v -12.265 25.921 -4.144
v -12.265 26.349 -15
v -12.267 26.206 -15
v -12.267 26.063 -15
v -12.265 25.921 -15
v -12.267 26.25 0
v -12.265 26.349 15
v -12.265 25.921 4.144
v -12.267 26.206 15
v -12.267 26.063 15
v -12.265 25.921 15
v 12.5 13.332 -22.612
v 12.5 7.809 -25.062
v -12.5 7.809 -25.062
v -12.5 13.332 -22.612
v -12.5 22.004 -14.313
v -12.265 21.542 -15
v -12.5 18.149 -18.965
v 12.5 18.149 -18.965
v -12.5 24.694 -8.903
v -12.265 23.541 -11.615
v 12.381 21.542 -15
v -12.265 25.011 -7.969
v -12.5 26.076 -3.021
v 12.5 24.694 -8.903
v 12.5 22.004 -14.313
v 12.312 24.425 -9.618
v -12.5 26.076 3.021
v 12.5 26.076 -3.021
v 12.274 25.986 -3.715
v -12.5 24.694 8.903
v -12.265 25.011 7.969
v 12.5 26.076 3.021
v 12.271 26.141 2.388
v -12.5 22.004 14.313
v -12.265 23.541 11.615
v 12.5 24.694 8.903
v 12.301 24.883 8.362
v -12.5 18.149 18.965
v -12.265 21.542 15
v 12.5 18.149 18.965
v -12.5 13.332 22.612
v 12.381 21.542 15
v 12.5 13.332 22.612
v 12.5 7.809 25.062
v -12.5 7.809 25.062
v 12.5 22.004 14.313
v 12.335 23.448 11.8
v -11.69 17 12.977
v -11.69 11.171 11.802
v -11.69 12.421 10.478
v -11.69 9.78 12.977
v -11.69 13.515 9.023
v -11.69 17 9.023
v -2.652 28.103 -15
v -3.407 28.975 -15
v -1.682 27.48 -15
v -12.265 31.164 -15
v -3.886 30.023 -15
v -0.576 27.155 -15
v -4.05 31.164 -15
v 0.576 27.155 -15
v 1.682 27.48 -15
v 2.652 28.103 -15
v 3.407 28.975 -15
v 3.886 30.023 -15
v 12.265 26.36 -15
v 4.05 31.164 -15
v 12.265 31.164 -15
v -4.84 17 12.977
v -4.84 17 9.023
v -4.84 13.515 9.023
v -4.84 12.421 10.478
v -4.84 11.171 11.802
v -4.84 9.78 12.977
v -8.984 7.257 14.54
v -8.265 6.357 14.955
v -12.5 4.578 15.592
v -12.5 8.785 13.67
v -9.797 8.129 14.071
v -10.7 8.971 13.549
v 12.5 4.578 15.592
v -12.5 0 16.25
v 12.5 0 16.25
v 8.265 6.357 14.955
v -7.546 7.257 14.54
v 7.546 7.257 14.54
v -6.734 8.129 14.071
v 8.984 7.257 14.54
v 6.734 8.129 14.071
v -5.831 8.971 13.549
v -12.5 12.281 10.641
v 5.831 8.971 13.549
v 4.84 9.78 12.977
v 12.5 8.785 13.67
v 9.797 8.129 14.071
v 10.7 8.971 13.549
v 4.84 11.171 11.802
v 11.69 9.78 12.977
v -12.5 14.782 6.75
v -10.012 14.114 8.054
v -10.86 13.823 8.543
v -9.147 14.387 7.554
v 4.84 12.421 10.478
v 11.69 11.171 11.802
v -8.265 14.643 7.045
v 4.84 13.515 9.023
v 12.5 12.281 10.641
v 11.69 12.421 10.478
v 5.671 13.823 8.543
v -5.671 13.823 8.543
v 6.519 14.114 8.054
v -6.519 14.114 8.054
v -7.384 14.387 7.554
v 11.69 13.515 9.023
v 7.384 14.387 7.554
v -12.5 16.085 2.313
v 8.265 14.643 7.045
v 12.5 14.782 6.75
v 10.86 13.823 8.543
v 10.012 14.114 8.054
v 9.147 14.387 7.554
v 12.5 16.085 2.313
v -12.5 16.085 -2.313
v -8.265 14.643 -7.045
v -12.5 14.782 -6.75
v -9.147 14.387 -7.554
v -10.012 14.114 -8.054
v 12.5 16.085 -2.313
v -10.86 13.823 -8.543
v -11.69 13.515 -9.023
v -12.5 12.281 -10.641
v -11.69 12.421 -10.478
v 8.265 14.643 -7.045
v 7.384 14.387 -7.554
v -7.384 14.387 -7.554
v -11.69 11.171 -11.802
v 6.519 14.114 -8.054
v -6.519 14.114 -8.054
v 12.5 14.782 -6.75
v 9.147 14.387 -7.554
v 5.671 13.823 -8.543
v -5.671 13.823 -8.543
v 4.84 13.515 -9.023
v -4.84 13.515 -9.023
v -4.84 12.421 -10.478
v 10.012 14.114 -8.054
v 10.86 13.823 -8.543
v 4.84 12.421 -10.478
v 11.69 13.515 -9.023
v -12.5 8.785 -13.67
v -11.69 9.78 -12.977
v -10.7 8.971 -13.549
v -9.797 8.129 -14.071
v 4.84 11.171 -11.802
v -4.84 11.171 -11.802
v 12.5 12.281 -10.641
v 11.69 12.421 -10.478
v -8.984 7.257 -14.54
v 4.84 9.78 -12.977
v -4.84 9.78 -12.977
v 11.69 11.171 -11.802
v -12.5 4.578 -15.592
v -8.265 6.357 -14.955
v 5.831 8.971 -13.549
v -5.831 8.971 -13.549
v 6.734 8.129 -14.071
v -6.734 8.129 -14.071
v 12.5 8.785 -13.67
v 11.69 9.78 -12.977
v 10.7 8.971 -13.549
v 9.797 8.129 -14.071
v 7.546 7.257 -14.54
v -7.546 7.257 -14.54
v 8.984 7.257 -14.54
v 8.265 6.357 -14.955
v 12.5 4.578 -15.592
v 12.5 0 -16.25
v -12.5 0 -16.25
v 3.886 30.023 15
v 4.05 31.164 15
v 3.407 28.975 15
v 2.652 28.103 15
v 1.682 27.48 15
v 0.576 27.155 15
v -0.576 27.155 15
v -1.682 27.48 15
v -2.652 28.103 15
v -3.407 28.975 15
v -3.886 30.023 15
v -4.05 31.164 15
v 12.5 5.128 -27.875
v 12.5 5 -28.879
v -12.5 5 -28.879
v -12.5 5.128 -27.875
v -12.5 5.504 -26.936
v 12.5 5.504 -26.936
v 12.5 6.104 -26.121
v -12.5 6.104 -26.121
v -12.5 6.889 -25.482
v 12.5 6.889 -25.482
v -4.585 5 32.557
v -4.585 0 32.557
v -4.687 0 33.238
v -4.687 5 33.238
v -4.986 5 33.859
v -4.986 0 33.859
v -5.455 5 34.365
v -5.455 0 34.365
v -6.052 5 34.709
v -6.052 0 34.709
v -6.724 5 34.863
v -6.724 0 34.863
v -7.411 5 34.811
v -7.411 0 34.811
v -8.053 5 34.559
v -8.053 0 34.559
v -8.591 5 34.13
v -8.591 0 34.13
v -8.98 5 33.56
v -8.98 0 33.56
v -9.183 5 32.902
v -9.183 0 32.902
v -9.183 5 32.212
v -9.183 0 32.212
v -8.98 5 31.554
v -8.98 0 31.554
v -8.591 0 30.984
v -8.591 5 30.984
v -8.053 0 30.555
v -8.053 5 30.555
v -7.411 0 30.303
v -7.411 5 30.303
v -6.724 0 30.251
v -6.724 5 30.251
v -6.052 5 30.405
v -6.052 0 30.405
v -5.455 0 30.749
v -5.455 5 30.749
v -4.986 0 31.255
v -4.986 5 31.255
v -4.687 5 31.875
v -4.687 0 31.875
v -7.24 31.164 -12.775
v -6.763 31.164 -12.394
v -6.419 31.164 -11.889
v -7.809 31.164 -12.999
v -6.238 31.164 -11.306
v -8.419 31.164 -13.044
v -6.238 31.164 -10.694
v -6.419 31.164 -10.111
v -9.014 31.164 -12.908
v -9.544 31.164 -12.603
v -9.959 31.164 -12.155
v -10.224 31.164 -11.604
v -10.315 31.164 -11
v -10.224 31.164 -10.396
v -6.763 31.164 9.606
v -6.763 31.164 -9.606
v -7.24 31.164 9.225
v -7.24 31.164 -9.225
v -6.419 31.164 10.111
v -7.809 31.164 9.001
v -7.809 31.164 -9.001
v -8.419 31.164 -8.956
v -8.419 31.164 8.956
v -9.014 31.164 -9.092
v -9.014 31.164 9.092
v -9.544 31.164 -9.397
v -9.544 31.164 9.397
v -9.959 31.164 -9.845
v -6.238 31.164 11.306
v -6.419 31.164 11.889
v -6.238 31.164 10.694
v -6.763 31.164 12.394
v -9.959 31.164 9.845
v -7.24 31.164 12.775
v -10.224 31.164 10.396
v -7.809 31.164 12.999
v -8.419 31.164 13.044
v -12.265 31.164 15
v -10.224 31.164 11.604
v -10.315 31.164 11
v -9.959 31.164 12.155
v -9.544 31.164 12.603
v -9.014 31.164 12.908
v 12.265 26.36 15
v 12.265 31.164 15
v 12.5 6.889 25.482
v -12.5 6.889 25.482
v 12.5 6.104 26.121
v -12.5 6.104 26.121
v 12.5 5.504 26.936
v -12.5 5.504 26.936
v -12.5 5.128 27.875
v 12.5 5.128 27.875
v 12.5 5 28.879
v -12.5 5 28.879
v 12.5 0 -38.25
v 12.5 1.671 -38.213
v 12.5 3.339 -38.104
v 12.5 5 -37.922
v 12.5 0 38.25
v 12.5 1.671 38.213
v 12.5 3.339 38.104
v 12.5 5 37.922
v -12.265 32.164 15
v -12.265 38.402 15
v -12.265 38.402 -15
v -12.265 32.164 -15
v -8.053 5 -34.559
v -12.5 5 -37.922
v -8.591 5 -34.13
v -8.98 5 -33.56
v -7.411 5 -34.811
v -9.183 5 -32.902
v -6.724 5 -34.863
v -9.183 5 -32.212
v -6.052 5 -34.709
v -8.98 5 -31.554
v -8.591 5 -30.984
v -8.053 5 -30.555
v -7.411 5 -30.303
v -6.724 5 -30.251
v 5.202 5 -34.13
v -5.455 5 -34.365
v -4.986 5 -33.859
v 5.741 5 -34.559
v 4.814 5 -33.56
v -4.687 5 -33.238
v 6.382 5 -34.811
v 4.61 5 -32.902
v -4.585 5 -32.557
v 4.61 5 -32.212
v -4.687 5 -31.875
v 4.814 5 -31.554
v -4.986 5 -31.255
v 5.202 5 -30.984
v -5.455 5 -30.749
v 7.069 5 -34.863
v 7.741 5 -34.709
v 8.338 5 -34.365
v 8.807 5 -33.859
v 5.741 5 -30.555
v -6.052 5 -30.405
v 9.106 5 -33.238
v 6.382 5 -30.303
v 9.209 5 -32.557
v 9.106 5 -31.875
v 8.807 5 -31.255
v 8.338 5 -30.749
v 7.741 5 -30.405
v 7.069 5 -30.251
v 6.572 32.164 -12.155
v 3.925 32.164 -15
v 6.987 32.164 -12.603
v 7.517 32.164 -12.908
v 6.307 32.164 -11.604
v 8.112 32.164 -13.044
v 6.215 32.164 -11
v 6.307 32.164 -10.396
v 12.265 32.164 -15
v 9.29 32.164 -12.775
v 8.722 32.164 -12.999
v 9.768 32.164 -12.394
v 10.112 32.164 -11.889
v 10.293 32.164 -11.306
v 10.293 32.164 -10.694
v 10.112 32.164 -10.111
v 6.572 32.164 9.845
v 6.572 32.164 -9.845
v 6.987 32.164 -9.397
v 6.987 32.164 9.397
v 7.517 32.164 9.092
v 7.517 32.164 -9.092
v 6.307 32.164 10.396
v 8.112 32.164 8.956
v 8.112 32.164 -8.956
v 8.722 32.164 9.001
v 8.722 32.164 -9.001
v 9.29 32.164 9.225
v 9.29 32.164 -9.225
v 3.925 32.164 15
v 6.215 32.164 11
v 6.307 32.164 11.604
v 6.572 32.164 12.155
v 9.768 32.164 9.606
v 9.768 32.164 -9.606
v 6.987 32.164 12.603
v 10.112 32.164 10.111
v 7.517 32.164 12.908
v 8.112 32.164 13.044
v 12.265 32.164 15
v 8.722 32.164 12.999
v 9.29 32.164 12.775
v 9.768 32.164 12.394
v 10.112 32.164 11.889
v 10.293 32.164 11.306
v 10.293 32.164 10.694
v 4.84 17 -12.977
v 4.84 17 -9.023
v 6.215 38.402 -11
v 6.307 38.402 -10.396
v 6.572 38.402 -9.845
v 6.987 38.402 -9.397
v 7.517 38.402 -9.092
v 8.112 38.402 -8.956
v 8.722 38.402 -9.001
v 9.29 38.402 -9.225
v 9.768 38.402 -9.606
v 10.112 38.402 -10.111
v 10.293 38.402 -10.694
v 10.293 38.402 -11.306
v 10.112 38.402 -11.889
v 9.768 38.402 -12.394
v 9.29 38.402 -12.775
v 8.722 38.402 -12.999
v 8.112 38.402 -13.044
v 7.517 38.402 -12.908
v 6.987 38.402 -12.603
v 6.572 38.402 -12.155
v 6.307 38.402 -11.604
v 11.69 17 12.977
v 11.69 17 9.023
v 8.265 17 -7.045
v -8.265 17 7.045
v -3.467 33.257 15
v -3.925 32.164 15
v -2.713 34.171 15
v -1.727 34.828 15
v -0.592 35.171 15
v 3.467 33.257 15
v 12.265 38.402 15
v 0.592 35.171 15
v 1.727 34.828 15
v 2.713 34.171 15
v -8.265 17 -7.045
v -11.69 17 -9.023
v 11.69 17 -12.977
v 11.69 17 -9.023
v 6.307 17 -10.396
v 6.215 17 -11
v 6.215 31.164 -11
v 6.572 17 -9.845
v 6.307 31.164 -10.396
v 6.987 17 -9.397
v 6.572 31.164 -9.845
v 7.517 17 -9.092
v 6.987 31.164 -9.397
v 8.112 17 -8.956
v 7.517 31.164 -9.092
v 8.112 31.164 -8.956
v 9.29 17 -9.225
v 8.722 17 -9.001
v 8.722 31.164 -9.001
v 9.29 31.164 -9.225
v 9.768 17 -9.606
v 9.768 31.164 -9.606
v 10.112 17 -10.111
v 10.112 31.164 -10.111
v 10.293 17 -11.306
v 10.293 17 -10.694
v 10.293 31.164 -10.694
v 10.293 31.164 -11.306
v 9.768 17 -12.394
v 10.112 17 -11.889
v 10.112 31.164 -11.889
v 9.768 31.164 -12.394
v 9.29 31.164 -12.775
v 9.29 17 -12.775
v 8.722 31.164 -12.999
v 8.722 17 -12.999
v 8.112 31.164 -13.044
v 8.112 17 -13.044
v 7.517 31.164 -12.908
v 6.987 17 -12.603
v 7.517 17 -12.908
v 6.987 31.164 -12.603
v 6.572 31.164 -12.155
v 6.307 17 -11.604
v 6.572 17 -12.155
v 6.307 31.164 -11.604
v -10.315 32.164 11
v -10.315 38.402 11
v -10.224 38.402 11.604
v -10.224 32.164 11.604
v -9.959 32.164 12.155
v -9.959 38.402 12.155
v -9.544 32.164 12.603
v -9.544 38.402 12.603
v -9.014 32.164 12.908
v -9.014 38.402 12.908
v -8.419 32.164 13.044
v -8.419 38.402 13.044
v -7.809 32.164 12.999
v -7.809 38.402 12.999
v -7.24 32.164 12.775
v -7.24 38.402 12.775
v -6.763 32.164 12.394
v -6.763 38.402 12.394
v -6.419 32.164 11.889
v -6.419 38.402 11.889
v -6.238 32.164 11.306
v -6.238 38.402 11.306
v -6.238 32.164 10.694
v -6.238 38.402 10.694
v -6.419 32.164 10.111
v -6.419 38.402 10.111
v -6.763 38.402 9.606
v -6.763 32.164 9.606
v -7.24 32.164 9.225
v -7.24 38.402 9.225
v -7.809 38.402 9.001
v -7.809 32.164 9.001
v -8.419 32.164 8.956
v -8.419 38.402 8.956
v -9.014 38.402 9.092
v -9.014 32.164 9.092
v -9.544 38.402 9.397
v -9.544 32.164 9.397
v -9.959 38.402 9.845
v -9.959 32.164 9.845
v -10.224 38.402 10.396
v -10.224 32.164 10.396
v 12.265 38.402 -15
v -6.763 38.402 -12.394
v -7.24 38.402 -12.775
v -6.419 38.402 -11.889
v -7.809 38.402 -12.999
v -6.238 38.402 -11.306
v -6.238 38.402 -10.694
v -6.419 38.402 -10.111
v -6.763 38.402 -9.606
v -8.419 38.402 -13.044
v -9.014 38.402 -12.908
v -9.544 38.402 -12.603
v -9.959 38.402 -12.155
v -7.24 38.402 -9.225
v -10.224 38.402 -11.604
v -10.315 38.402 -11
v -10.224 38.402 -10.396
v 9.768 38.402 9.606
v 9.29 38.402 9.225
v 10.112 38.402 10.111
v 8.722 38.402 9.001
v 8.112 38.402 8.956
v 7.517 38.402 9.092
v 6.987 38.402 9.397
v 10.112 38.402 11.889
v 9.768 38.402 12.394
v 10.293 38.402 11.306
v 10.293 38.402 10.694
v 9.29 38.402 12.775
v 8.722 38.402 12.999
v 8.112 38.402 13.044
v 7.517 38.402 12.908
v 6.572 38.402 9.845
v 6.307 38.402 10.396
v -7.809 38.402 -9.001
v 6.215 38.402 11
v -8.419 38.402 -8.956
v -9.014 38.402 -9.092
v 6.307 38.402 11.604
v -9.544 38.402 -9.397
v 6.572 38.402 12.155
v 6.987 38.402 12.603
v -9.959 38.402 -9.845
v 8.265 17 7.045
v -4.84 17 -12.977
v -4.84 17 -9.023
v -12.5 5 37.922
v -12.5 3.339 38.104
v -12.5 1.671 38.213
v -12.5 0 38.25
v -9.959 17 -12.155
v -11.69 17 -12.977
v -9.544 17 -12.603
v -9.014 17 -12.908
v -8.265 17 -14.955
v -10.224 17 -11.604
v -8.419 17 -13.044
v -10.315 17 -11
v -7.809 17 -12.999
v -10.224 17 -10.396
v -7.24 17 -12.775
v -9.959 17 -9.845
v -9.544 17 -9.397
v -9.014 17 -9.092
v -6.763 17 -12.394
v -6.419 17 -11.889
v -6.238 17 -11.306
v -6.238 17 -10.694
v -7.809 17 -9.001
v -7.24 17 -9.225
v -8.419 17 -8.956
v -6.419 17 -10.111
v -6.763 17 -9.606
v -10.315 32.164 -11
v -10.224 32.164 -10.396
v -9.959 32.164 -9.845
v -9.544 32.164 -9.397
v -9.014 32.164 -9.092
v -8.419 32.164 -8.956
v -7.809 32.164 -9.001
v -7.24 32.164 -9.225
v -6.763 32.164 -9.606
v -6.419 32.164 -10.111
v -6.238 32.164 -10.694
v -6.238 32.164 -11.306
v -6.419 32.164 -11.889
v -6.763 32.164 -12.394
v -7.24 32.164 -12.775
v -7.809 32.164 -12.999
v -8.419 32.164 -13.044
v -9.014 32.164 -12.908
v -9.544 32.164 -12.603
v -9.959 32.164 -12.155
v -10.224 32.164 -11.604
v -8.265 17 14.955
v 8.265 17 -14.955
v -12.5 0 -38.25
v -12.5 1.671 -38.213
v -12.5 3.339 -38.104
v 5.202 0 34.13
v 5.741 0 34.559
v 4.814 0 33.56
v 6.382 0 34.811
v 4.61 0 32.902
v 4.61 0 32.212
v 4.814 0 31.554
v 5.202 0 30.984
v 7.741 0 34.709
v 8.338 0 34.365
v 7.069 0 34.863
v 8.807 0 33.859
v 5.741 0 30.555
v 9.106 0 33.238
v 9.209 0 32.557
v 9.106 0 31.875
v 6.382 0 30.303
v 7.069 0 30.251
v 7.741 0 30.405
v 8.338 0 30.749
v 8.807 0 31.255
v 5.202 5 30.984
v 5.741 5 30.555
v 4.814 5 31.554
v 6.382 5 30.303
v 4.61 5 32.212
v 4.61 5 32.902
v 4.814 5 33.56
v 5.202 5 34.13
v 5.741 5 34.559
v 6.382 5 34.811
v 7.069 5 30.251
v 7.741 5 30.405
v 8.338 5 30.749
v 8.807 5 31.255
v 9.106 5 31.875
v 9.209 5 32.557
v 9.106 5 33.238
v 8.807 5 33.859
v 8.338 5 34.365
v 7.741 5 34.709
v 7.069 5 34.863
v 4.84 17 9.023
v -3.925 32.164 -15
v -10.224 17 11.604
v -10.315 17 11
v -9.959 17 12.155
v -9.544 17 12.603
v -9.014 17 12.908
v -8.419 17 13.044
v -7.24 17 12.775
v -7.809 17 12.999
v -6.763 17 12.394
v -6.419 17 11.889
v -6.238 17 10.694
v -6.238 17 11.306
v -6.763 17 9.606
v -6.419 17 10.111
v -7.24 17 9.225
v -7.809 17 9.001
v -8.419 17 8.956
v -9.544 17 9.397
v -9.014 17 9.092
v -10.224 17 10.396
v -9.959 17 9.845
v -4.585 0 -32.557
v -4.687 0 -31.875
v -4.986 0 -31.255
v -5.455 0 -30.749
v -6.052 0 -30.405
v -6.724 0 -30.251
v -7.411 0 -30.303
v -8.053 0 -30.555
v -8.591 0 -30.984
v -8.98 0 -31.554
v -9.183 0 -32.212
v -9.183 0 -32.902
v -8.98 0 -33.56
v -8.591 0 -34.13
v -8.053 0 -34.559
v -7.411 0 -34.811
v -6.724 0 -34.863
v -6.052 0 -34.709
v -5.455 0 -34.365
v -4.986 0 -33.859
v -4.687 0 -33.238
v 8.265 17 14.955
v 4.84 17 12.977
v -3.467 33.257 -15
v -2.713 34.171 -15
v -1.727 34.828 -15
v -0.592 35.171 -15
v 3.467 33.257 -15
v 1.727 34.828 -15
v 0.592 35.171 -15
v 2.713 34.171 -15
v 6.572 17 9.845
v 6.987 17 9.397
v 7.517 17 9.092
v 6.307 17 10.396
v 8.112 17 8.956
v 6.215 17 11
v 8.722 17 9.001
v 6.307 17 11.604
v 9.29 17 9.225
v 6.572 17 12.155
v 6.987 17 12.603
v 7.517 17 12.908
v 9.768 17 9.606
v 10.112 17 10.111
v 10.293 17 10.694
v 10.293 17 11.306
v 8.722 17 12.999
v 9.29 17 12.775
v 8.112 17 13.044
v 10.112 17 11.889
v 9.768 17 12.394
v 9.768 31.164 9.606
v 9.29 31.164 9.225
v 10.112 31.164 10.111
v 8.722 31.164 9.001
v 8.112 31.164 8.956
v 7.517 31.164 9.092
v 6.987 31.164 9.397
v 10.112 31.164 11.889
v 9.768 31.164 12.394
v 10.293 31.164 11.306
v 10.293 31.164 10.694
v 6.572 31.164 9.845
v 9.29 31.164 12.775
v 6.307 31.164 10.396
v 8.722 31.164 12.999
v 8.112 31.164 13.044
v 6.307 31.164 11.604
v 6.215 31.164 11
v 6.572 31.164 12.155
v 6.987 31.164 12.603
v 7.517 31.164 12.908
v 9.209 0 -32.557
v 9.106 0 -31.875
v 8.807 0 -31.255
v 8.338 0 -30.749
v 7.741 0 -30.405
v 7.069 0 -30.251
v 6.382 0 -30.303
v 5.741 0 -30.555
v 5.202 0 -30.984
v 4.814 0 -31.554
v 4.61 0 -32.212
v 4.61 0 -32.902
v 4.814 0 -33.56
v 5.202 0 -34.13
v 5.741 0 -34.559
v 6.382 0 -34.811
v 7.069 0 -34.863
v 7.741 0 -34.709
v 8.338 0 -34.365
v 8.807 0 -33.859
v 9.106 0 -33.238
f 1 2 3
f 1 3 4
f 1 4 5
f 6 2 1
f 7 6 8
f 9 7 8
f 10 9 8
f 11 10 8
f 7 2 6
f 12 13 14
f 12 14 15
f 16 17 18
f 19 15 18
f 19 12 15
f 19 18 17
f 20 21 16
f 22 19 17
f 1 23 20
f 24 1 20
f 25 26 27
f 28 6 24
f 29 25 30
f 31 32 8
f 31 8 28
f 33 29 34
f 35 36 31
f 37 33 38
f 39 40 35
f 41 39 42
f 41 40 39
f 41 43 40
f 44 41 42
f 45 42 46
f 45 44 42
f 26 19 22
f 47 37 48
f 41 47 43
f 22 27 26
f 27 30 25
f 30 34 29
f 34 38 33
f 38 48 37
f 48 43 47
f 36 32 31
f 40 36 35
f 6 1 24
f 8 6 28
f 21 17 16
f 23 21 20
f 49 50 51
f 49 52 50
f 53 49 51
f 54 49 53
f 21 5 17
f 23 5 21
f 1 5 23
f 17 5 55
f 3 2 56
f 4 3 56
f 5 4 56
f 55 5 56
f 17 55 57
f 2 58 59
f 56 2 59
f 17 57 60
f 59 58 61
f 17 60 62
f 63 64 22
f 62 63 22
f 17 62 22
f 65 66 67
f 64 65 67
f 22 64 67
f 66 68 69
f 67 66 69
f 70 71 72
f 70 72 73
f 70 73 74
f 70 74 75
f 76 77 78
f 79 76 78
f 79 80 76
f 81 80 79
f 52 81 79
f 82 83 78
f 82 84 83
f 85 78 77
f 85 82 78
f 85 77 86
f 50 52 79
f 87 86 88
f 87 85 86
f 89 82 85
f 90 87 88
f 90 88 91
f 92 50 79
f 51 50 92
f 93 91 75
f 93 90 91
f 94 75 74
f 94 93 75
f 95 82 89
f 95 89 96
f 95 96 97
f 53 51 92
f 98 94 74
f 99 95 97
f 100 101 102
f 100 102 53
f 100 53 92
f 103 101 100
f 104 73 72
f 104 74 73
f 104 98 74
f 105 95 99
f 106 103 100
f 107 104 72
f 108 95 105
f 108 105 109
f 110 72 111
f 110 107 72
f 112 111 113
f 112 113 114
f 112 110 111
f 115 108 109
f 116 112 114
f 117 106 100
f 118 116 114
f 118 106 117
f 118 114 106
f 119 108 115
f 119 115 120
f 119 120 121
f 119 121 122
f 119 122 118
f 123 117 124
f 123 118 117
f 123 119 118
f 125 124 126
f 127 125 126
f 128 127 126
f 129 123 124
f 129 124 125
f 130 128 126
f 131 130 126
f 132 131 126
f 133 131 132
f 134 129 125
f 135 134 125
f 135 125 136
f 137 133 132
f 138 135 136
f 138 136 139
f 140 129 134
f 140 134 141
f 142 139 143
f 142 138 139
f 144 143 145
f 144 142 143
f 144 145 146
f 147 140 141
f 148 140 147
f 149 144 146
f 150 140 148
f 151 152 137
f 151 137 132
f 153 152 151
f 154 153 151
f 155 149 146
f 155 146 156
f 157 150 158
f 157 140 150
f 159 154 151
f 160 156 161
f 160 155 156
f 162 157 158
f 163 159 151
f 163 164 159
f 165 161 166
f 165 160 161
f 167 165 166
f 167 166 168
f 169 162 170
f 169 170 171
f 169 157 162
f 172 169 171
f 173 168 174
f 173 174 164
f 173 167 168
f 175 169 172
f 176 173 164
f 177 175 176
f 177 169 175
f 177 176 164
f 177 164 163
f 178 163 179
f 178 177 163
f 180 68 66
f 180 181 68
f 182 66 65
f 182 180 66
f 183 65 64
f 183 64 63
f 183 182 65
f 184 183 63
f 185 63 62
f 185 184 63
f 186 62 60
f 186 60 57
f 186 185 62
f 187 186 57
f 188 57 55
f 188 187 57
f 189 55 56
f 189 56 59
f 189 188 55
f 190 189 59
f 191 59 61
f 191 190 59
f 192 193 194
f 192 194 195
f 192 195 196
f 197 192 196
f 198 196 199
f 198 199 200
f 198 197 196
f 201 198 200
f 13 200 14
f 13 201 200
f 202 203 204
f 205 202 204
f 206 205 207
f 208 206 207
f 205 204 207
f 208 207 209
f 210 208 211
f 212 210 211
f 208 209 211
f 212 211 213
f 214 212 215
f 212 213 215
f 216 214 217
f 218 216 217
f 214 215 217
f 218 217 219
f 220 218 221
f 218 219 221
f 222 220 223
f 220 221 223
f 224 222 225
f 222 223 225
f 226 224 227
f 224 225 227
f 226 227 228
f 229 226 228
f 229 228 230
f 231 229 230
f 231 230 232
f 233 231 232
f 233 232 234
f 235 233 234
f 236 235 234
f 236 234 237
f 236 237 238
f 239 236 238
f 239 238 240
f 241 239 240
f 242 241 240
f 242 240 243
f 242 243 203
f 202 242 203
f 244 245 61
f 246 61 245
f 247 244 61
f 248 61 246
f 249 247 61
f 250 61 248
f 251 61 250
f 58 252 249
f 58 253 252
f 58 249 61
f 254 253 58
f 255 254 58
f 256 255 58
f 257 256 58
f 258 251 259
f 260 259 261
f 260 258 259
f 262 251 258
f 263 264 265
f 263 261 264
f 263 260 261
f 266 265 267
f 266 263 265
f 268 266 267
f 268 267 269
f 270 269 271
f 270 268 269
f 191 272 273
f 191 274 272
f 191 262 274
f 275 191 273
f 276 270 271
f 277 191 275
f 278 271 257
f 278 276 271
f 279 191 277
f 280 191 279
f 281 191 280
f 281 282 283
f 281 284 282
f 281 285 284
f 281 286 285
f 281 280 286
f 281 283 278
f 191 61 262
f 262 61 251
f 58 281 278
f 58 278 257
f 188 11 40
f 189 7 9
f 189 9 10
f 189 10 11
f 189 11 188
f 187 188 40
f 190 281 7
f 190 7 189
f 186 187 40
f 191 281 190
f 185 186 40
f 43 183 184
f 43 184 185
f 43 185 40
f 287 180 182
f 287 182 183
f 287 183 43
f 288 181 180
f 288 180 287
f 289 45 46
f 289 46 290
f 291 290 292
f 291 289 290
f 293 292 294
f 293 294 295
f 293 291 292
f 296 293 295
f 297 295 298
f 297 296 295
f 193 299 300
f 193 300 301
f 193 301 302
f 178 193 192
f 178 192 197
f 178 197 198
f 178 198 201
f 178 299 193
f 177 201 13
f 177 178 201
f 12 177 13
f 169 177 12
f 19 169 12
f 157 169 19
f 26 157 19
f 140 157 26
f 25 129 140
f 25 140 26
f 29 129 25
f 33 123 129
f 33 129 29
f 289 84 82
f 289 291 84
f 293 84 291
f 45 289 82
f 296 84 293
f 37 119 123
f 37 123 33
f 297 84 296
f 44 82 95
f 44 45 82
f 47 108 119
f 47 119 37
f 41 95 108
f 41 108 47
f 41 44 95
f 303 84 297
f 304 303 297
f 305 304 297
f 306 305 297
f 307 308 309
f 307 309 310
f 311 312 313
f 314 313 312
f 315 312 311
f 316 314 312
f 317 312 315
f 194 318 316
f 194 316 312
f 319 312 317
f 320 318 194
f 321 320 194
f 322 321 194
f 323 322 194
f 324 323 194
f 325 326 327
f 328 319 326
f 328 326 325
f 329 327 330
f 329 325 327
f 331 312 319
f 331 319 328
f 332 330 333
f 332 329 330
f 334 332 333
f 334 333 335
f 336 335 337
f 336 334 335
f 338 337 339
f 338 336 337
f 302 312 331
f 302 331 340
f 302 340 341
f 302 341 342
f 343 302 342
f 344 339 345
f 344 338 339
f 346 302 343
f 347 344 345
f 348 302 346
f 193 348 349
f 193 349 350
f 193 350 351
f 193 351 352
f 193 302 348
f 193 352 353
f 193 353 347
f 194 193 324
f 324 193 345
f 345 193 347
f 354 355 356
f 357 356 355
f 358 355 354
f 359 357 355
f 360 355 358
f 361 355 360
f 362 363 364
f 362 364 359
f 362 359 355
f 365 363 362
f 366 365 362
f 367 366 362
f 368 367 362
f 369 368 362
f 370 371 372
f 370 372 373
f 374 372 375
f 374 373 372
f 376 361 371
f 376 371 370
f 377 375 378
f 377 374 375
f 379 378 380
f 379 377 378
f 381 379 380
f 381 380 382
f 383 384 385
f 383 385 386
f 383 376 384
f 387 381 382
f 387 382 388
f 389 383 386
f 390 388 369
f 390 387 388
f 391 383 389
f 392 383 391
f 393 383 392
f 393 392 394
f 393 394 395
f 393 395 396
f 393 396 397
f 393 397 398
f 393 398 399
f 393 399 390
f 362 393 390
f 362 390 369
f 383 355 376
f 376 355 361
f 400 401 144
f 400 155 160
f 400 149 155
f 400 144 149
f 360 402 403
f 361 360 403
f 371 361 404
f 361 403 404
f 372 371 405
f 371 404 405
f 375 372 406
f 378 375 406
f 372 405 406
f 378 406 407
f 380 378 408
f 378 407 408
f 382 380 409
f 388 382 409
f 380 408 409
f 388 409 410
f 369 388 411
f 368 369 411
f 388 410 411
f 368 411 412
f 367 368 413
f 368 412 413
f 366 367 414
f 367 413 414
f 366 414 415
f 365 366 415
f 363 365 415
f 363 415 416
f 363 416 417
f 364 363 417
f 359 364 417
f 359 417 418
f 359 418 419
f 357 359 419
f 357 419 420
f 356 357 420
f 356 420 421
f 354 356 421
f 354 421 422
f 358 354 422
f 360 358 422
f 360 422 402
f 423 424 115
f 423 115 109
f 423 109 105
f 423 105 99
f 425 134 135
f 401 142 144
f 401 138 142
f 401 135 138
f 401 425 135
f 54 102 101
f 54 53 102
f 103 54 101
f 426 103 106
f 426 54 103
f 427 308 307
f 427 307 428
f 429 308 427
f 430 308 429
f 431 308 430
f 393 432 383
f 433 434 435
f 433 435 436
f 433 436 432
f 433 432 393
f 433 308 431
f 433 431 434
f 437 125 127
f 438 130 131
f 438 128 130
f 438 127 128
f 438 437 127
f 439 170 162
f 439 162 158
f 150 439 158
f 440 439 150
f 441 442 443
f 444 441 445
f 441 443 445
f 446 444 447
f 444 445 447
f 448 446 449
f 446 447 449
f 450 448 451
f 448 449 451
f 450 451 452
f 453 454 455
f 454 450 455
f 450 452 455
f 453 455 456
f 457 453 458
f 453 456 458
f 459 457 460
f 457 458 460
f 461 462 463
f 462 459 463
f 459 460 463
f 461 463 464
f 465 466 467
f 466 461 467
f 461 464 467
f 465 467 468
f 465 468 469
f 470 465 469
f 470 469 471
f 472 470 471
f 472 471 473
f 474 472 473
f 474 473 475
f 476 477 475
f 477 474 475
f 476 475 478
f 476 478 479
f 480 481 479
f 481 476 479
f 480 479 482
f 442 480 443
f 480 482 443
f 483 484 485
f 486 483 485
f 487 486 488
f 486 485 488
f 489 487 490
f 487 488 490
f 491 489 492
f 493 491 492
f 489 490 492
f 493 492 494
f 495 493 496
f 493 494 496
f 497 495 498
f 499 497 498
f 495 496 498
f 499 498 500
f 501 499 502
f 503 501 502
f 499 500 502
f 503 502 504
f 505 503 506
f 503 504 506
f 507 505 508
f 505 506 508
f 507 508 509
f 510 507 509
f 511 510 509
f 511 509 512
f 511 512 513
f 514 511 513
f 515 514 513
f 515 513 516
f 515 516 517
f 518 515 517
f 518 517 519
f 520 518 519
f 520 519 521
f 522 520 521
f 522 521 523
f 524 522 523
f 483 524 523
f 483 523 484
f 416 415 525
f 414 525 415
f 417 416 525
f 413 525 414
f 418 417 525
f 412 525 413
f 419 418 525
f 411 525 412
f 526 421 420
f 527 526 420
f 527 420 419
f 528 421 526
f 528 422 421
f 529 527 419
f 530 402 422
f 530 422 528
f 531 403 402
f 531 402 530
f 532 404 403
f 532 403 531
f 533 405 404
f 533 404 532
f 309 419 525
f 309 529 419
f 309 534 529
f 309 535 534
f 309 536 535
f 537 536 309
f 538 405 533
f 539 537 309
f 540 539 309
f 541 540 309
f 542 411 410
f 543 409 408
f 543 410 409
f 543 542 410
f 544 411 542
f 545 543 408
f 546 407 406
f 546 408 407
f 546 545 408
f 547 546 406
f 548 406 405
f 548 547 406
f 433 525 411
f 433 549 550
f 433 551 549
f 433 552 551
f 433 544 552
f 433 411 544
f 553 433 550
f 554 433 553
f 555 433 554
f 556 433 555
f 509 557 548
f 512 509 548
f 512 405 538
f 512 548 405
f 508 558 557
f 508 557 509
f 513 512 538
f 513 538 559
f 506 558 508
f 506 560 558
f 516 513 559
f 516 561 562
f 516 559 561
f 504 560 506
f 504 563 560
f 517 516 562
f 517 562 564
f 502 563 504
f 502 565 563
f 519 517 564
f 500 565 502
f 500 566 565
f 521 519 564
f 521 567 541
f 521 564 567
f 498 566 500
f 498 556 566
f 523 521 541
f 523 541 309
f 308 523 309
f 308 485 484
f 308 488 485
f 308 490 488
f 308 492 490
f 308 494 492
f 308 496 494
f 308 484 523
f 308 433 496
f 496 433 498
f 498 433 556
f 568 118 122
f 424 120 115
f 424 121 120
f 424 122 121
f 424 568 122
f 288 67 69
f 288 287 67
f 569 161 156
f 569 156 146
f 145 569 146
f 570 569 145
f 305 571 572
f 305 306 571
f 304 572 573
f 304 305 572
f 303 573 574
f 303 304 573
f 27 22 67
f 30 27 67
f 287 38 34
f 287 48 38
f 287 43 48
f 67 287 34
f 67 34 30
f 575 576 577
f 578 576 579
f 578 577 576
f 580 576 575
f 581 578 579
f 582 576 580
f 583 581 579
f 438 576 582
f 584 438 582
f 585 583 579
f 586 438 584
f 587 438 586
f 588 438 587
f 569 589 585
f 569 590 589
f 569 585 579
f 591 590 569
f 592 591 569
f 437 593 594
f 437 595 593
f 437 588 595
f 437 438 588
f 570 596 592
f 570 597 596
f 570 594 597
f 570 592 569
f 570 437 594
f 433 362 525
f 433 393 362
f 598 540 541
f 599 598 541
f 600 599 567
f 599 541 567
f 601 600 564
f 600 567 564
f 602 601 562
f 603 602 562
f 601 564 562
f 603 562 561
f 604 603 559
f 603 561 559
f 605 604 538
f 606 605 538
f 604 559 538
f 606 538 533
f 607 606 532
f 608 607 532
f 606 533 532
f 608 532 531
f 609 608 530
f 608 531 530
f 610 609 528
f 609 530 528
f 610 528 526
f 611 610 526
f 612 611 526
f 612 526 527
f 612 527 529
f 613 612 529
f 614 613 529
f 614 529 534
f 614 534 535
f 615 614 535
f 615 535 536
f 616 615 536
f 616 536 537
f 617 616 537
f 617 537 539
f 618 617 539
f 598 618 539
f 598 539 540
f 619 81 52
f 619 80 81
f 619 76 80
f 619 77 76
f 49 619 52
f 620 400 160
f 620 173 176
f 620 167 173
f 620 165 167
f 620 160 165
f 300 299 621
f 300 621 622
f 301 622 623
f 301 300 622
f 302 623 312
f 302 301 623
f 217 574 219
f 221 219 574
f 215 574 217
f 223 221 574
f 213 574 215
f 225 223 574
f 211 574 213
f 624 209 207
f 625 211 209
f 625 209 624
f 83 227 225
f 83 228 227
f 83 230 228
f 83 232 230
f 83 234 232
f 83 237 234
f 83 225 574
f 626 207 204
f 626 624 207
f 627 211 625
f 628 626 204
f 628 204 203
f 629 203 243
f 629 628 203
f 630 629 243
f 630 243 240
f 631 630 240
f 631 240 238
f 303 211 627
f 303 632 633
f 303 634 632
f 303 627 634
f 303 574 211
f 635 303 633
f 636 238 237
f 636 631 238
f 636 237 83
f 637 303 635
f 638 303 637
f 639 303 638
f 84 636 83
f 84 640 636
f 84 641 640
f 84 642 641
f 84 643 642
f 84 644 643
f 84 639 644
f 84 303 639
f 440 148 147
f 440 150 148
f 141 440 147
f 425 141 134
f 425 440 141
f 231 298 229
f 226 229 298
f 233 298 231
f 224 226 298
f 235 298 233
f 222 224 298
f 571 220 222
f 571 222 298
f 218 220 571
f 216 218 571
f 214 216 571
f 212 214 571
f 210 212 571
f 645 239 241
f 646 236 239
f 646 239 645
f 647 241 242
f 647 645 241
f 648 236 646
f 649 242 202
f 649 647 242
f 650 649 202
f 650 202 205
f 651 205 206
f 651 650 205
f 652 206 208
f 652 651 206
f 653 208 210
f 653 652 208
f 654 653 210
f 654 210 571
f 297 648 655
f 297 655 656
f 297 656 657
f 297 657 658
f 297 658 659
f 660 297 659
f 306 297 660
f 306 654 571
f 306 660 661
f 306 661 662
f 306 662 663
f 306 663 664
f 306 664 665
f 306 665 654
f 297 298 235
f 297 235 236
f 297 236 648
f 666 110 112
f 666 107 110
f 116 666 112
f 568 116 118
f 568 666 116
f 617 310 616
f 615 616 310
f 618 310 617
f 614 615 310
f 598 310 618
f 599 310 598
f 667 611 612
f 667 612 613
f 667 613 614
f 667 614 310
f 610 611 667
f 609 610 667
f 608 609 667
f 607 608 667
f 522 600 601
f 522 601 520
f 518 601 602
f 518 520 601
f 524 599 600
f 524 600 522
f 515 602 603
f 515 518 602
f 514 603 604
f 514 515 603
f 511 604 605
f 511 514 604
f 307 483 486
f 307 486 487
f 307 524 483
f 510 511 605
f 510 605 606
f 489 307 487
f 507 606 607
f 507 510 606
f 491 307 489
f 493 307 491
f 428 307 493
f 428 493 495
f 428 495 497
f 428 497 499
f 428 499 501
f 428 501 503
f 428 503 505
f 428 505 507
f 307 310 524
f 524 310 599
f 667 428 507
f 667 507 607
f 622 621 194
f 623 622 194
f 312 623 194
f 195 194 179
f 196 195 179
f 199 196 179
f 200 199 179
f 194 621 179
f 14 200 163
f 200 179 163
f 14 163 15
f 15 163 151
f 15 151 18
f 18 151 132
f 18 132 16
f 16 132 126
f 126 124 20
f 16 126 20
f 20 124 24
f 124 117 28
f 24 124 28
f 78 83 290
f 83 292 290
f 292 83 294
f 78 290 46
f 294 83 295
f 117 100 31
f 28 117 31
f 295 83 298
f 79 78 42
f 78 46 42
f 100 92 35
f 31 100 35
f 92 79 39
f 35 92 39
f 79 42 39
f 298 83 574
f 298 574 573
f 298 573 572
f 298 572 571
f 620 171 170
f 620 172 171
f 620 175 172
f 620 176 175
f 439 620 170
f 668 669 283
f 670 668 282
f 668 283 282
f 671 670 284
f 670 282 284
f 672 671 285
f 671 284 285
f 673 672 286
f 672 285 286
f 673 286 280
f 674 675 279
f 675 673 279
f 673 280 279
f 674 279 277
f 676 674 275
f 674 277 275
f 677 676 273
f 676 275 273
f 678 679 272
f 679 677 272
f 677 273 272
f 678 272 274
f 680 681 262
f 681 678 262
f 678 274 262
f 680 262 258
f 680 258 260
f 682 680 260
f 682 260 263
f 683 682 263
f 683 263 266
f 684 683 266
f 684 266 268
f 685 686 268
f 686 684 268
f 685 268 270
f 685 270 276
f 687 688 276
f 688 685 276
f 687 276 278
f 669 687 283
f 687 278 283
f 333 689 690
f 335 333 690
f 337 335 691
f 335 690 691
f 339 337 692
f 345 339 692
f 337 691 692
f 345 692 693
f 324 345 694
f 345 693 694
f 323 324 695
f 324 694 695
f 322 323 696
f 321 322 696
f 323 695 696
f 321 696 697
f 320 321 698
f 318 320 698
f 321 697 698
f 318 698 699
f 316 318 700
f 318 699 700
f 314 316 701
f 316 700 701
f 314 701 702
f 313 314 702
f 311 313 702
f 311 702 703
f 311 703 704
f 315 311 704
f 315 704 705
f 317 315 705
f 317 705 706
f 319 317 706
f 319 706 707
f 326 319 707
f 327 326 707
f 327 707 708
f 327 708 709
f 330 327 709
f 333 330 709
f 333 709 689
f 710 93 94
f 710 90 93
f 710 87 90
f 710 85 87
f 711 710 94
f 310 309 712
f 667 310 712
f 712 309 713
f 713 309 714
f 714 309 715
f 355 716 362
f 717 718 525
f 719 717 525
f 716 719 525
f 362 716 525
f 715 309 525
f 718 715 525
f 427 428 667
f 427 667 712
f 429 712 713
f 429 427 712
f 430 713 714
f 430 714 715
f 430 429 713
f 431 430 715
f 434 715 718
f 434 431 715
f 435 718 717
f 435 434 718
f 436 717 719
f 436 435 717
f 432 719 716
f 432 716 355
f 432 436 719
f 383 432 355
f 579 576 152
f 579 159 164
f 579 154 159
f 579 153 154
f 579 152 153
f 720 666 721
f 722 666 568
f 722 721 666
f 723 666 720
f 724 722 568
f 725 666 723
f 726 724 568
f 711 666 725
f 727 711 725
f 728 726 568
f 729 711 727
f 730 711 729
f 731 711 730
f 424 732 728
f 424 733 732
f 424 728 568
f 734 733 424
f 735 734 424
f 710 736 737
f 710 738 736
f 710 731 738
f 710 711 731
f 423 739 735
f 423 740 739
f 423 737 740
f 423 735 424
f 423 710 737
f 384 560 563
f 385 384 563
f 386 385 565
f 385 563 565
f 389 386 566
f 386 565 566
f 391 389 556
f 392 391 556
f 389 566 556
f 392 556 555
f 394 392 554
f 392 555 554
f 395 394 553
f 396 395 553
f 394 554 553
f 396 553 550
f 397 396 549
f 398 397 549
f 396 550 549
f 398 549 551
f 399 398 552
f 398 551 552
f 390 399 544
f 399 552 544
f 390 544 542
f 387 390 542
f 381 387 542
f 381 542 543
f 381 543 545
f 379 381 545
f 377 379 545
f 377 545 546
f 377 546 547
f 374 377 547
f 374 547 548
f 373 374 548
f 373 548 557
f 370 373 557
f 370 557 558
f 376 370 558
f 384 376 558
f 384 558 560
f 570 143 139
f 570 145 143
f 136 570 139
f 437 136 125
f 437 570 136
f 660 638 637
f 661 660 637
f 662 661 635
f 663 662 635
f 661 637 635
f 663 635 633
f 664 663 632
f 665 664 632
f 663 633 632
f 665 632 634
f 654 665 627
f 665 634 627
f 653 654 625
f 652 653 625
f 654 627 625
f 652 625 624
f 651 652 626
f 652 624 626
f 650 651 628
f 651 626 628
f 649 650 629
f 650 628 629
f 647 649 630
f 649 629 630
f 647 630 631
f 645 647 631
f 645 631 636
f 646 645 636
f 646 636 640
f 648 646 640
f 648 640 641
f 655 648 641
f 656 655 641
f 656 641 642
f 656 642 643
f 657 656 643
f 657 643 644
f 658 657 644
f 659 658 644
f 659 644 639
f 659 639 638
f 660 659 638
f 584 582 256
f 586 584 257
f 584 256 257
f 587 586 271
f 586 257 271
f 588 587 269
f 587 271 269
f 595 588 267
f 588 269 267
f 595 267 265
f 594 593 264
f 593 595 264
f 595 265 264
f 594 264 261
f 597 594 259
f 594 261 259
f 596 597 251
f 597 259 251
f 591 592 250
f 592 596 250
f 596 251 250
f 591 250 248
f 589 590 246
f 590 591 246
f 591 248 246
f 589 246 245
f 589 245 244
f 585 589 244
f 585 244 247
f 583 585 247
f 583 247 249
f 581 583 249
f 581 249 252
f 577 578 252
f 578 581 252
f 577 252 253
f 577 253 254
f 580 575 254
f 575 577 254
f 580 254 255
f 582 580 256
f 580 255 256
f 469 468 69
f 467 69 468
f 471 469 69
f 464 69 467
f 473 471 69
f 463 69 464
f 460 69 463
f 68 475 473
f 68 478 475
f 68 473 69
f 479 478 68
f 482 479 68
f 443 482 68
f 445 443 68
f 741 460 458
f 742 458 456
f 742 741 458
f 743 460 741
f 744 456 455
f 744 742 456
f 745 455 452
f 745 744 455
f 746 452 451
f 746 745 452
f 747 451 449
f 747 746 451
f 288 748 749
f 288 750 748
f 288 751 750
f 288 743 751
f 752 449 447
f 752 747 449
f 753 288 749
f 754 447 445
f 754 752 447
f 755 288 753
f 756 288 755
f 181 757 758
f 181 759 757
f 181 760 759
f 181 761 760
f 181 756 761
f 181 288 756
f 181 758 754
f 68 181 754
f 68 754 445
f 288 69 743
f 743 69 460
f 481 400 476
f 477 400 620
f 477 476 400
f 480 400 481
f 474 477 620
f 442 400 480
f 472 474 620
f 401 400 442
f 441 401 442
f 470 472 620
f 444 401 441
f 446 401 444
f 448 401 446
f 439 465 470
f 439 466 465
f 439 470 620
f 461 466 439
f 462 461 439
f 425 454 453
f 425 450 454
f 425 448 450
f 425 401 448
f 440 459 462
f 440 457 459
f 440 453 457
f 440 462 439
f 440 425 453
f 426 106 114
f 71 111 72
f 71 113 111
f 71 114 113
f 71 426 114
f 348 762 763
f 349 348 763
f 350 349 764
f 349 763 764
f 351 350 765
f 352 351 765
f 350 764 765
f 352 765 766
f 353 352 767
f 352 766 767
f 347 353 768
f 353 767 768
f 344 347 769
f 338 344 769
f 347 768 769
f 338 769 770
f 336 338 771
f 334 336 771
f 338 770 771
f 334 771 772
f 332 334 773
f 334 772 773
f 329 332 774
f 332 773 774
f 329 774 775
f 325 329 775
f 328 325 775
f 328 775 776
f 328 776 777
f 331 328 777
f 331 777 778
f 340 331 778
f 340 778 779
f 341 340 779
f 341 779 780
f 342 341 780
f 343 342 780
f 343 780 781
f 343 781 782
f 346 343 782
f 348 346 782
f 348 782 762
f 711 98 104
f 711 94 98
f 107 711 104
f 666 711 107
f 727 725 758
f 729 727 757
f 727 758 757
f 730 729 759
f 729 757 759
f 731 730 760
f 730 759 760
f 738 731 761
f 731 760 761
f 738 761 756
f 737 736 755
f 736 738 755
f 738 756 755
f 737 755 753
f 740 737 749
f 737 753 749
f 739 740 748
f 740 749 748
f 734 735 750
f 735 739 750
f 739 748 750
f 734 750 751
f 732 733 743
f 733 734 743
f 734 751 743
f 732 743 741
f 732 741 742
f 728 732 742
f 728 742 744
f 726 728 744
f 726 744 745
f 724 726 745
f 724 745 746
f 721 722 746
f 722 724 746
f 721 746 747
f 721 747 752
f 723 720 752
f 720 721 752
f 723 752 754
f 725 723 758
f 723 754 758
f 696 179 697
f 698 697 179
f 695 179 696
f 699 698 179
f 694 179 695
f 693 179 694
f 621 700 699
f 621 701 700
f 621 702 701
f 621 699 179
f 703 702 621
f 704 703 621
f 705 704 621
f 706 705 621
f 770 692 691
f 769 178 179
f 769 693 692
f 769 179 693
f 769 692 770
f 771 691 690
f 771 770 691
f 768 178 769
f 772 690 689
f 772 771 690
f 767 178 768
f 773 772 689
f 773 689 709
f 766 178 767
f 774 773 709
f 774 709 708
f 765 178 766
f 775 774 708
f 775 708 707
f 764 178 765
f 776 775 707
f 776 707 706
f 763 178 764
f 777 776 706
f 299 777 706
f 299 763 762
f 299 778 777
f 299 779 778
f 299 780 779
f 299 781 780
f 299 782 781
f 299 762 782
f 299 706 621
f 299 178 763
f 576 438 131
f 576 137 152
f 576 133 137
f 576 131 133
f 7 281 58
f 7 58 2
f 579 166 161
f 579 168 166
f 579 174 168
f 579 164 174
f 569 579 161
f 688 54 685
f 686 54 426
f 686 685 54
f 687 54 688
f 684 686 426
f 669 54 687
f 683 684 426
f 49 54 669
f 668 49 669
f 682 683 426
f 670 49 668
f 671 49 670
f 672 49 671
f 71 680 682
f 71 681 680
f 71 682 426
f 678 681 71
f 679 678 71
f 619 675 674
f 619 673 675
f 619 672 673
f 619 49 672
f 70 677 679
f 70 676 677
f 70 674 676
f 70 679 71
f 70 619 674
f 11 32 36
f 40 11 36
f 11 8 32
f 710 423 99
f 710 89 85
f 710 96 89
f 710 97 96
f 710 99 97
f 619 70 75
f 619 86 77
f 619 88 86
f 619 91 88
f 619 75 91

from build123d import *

# Parameters (mm, degrees)
F1_DEPTH  = 12.5
F2_R      = 2.3120560343
F3_DEPTH  = 26.251
F5_DEPTH  = 15
F6_R      = 2.05
F7_DEPTH  = 35
F9_R      = 2.05
F10_DEPTH = 25


# Not quite as in the source:
# - ends of sketch curves that miss each other by under 0.0002 mm in the source are joined


with BuildPart() as f1:
    # F0 (on Right) → F1 (new body, symmetric)
    with BuildSketch(Plane.YZ):
        with BuildLine():
            ThreePointArc((0, 16.25), (16.25, 0), (0, -16.25))
            Line((0, -16.25), (0, -38.25))
            ThreePointArc((0, -38.25), (2.5053801525, -38.1678604364), (5, -37.921794525))
            Line((5, -37.921794525), (4.9999998882, -28.8786509221))
            ThreePointArc((4.9999998882, -28.8786509221), (5.7778380649, -26.509152159), (7.8086833246, -25.0616632476))
            ThreePointArc((7.8086833246, -25.0616632476), (26.25, -5.08e-08), (7.8086834216, 25.0616632174))
            ThreePointArc((7.8086834216, 25.0616632174), (5.7778381721, 26.5091521304), (5, 28.8786508873))
            Line((5, 28.8786508873), (5, 37.921794525))
            ThreePointArc((5, 37.921794525), (2.5053801525, 38.1678604364), (0, 38.25))
            Line((0, 38.25), (0, 16.25))
        make_face()
    extrude(amount=F1_DEPTH, both=True)

    # F2 (on Front) → F3 (cut, through all)
    with BuildSketch(Plane.XZ):
        with Locations((6.896616891, 32.556977123)):
            Circle(F2_R)
        with Locations((-6.896616891, 32.556977123)):
            Circle(F2_R)
        with Locations((-6.896616891, -32.556977123)):
            Circle(F2_R)
        with Locations((6.896616891, -32.556977123)):
            Circle(F2_R)
    extrude(amount=-F3_DEPTH, mode=Mode.SUBTRACT)

    # F4 (on Top) → F5 (join, symmetric)
    with BuildSketch(Plane.XY):
        with BuildLine():
            ThreePointArc((4.05, 31.1641552804), (0, 27.1141552804), (-4.05, 31.1641552804))
            Line((-4.05, 31.1641552804), (-12.2654928641, 31.1641552804))
            Line((-12.2654928641, 31.1641552804), (-12.2654928641, 26.3486900835))
            Line((-12.2654928641, 26.3486900835), (-12.2654928641, 25.9208133907))
            Line((-12.2654928641, 25.9208133907), (-12.2654928641, 19.209831953))
            Line((-12.2654928641, 19.209831953), (-10.1258861735, 19.209831953))
            Line((-10.1258861735, 19.209831953), (10.1258861735, 19.209831953))
            Line((10.1258861735, 19.209831953), (12.4368978535, 19.209831953))
            Line((12.4368978535, 19.209831953), (12.2654928641, 26.3595975861))
            Line((12.2654928641, 26.3595975861), (12.2654928641, 31.1641552804))
            Line((12.2654928641, 31.1641552804), (4.05, 31.1641552804))
        make_face()
        with BuildLine():
            Line((-12.2654928641, 25.9208133907), (-12.2654928641, 26.3486900835))
            ThreePointArc((-12.2654928641, 26.3486900835), (-12.2673585101, 26.1347517371), (-12.2654928641, 25.9208133907))
        make_face()
    extrude(amount=F5_DEPTH, both=True)


with BuildPart() as f5:
    # F4 (on Top) → F5, piece 2 (new body, symmetric)
    with BuildSketch(Plane.XY):
        with BuildLine():
            Line((12.2654928641, 38.4021102472), (0, 38.4021102472))
            Line((0, 38.4021102472), (-12.2654928641, 38.4021102472))
            Line((-12.2654928641, 38.4021102472), (-12.2654928641, 32.1641552804))
            Line((-12.2654928641, 32.1641552804), (-3.9246018906, 32.1641552804))
            ThreePointArc((-3.9246018906, 32.1641552804), (0, 35.2141552804), (3.9246018906, 32.1641552804))
            Line((3.9246018906, 32.1641552804), (12.2654928641, 32.1641552804))
            Line((12.2654928641, 32.1641552804), (12.2654928641, 38.4021102472))
        make_face()
    extrude(amount=F5_DEPTH, both=True)


with BuildPart() as f7_tool:
    # F6 (on face) → F7 (new body)
    with BuildSketch(Plane(origin=(0, 38.4021102472, 0), x_dir=(-1, 0, 0), z_dir=(0, 1, 0))):
        with Locations((-8.2654928641, 11)):
            Circle(F6_R)
        with Locations((8.2654928641, 11)):
            Circle(F6_R)
        with Locations((-8.2654928641, -11)):
            Circle(F6_R)
        with Locations((8.2654928641, -11)):
            Circle(F6_R)
    extrude(amount=-F7_DEPTH)


with BuildPart() as f1_1:
    add(f1.part)

    # F7: cut by f7_tool
    add(f7_tool.part, mode=Mode.SUBTRACT)

    # F9 (on offset) → F10 (cut)
    with BuildSketch(Plane.XZ.offset(-17)):
        Polygon((4.8404928641, 12.977424672), (4.8404928641, 9.022575328), (8.2654928641, 7.0451506561), (11.6904928641, 9.022575328), (11.6904928641, 12.977424672), (8.2654928641, 14.9548493439), align=None)
        with Locations((8.2654928641, 11)):
            Circle(F9_R, mode=Mode.SUBTRACT)
        Polygon((-4.8404928641, 9.022575328), (-4.8404928641, 12.977424672), (-8.2654928641, 14.9548493439), (-11.6904928641, 12.977424672), (-11.6904928641, 9.022575328), (-8.2654928641, 7.0451506561), align=None)
        with Locations((-8.2654928641, 11)):
            Circle(F9_R, mode=Mode.SUBTRACT)
        Polygon((8.2654928641, -7.0451506561), (4.8404928641, -9.022575328), (4.8404928641, -12.977424672), (8.2654928641, -14.9548493439), (11.6904928641, -12.977424672), (11.6904928641, -9.022575328), align=None)
        with Locations((8.2654928641, -11)):
            Circle(F9_R, mode=Mode.SUBTRACT)
        Polygon((-11.6904928641, -9.022575328), (-11.6904928641, -12.977424672), (-8.2654928641, -14.9548493439), (-4.8404928641, -12.977424672), (-4.8404928641, -9.022575328), (-8.2654928641, -7.0451506561), align=None)
        with Locations((-8.2654928641, -11)):
            Circle(F9_R, mode=Mode.SUBTRACT)
    extrude(amount=F10_DEPTH, mode=Mode.SUBTRACT)


with BuildPart() as f5_1:
    add(f5.part)

    # F7: cut by f7_tool
    add(f7_tool.part, mode=Mode.SUBTRACT)


solid = Compound([f1_1.part, f5_1.part])
